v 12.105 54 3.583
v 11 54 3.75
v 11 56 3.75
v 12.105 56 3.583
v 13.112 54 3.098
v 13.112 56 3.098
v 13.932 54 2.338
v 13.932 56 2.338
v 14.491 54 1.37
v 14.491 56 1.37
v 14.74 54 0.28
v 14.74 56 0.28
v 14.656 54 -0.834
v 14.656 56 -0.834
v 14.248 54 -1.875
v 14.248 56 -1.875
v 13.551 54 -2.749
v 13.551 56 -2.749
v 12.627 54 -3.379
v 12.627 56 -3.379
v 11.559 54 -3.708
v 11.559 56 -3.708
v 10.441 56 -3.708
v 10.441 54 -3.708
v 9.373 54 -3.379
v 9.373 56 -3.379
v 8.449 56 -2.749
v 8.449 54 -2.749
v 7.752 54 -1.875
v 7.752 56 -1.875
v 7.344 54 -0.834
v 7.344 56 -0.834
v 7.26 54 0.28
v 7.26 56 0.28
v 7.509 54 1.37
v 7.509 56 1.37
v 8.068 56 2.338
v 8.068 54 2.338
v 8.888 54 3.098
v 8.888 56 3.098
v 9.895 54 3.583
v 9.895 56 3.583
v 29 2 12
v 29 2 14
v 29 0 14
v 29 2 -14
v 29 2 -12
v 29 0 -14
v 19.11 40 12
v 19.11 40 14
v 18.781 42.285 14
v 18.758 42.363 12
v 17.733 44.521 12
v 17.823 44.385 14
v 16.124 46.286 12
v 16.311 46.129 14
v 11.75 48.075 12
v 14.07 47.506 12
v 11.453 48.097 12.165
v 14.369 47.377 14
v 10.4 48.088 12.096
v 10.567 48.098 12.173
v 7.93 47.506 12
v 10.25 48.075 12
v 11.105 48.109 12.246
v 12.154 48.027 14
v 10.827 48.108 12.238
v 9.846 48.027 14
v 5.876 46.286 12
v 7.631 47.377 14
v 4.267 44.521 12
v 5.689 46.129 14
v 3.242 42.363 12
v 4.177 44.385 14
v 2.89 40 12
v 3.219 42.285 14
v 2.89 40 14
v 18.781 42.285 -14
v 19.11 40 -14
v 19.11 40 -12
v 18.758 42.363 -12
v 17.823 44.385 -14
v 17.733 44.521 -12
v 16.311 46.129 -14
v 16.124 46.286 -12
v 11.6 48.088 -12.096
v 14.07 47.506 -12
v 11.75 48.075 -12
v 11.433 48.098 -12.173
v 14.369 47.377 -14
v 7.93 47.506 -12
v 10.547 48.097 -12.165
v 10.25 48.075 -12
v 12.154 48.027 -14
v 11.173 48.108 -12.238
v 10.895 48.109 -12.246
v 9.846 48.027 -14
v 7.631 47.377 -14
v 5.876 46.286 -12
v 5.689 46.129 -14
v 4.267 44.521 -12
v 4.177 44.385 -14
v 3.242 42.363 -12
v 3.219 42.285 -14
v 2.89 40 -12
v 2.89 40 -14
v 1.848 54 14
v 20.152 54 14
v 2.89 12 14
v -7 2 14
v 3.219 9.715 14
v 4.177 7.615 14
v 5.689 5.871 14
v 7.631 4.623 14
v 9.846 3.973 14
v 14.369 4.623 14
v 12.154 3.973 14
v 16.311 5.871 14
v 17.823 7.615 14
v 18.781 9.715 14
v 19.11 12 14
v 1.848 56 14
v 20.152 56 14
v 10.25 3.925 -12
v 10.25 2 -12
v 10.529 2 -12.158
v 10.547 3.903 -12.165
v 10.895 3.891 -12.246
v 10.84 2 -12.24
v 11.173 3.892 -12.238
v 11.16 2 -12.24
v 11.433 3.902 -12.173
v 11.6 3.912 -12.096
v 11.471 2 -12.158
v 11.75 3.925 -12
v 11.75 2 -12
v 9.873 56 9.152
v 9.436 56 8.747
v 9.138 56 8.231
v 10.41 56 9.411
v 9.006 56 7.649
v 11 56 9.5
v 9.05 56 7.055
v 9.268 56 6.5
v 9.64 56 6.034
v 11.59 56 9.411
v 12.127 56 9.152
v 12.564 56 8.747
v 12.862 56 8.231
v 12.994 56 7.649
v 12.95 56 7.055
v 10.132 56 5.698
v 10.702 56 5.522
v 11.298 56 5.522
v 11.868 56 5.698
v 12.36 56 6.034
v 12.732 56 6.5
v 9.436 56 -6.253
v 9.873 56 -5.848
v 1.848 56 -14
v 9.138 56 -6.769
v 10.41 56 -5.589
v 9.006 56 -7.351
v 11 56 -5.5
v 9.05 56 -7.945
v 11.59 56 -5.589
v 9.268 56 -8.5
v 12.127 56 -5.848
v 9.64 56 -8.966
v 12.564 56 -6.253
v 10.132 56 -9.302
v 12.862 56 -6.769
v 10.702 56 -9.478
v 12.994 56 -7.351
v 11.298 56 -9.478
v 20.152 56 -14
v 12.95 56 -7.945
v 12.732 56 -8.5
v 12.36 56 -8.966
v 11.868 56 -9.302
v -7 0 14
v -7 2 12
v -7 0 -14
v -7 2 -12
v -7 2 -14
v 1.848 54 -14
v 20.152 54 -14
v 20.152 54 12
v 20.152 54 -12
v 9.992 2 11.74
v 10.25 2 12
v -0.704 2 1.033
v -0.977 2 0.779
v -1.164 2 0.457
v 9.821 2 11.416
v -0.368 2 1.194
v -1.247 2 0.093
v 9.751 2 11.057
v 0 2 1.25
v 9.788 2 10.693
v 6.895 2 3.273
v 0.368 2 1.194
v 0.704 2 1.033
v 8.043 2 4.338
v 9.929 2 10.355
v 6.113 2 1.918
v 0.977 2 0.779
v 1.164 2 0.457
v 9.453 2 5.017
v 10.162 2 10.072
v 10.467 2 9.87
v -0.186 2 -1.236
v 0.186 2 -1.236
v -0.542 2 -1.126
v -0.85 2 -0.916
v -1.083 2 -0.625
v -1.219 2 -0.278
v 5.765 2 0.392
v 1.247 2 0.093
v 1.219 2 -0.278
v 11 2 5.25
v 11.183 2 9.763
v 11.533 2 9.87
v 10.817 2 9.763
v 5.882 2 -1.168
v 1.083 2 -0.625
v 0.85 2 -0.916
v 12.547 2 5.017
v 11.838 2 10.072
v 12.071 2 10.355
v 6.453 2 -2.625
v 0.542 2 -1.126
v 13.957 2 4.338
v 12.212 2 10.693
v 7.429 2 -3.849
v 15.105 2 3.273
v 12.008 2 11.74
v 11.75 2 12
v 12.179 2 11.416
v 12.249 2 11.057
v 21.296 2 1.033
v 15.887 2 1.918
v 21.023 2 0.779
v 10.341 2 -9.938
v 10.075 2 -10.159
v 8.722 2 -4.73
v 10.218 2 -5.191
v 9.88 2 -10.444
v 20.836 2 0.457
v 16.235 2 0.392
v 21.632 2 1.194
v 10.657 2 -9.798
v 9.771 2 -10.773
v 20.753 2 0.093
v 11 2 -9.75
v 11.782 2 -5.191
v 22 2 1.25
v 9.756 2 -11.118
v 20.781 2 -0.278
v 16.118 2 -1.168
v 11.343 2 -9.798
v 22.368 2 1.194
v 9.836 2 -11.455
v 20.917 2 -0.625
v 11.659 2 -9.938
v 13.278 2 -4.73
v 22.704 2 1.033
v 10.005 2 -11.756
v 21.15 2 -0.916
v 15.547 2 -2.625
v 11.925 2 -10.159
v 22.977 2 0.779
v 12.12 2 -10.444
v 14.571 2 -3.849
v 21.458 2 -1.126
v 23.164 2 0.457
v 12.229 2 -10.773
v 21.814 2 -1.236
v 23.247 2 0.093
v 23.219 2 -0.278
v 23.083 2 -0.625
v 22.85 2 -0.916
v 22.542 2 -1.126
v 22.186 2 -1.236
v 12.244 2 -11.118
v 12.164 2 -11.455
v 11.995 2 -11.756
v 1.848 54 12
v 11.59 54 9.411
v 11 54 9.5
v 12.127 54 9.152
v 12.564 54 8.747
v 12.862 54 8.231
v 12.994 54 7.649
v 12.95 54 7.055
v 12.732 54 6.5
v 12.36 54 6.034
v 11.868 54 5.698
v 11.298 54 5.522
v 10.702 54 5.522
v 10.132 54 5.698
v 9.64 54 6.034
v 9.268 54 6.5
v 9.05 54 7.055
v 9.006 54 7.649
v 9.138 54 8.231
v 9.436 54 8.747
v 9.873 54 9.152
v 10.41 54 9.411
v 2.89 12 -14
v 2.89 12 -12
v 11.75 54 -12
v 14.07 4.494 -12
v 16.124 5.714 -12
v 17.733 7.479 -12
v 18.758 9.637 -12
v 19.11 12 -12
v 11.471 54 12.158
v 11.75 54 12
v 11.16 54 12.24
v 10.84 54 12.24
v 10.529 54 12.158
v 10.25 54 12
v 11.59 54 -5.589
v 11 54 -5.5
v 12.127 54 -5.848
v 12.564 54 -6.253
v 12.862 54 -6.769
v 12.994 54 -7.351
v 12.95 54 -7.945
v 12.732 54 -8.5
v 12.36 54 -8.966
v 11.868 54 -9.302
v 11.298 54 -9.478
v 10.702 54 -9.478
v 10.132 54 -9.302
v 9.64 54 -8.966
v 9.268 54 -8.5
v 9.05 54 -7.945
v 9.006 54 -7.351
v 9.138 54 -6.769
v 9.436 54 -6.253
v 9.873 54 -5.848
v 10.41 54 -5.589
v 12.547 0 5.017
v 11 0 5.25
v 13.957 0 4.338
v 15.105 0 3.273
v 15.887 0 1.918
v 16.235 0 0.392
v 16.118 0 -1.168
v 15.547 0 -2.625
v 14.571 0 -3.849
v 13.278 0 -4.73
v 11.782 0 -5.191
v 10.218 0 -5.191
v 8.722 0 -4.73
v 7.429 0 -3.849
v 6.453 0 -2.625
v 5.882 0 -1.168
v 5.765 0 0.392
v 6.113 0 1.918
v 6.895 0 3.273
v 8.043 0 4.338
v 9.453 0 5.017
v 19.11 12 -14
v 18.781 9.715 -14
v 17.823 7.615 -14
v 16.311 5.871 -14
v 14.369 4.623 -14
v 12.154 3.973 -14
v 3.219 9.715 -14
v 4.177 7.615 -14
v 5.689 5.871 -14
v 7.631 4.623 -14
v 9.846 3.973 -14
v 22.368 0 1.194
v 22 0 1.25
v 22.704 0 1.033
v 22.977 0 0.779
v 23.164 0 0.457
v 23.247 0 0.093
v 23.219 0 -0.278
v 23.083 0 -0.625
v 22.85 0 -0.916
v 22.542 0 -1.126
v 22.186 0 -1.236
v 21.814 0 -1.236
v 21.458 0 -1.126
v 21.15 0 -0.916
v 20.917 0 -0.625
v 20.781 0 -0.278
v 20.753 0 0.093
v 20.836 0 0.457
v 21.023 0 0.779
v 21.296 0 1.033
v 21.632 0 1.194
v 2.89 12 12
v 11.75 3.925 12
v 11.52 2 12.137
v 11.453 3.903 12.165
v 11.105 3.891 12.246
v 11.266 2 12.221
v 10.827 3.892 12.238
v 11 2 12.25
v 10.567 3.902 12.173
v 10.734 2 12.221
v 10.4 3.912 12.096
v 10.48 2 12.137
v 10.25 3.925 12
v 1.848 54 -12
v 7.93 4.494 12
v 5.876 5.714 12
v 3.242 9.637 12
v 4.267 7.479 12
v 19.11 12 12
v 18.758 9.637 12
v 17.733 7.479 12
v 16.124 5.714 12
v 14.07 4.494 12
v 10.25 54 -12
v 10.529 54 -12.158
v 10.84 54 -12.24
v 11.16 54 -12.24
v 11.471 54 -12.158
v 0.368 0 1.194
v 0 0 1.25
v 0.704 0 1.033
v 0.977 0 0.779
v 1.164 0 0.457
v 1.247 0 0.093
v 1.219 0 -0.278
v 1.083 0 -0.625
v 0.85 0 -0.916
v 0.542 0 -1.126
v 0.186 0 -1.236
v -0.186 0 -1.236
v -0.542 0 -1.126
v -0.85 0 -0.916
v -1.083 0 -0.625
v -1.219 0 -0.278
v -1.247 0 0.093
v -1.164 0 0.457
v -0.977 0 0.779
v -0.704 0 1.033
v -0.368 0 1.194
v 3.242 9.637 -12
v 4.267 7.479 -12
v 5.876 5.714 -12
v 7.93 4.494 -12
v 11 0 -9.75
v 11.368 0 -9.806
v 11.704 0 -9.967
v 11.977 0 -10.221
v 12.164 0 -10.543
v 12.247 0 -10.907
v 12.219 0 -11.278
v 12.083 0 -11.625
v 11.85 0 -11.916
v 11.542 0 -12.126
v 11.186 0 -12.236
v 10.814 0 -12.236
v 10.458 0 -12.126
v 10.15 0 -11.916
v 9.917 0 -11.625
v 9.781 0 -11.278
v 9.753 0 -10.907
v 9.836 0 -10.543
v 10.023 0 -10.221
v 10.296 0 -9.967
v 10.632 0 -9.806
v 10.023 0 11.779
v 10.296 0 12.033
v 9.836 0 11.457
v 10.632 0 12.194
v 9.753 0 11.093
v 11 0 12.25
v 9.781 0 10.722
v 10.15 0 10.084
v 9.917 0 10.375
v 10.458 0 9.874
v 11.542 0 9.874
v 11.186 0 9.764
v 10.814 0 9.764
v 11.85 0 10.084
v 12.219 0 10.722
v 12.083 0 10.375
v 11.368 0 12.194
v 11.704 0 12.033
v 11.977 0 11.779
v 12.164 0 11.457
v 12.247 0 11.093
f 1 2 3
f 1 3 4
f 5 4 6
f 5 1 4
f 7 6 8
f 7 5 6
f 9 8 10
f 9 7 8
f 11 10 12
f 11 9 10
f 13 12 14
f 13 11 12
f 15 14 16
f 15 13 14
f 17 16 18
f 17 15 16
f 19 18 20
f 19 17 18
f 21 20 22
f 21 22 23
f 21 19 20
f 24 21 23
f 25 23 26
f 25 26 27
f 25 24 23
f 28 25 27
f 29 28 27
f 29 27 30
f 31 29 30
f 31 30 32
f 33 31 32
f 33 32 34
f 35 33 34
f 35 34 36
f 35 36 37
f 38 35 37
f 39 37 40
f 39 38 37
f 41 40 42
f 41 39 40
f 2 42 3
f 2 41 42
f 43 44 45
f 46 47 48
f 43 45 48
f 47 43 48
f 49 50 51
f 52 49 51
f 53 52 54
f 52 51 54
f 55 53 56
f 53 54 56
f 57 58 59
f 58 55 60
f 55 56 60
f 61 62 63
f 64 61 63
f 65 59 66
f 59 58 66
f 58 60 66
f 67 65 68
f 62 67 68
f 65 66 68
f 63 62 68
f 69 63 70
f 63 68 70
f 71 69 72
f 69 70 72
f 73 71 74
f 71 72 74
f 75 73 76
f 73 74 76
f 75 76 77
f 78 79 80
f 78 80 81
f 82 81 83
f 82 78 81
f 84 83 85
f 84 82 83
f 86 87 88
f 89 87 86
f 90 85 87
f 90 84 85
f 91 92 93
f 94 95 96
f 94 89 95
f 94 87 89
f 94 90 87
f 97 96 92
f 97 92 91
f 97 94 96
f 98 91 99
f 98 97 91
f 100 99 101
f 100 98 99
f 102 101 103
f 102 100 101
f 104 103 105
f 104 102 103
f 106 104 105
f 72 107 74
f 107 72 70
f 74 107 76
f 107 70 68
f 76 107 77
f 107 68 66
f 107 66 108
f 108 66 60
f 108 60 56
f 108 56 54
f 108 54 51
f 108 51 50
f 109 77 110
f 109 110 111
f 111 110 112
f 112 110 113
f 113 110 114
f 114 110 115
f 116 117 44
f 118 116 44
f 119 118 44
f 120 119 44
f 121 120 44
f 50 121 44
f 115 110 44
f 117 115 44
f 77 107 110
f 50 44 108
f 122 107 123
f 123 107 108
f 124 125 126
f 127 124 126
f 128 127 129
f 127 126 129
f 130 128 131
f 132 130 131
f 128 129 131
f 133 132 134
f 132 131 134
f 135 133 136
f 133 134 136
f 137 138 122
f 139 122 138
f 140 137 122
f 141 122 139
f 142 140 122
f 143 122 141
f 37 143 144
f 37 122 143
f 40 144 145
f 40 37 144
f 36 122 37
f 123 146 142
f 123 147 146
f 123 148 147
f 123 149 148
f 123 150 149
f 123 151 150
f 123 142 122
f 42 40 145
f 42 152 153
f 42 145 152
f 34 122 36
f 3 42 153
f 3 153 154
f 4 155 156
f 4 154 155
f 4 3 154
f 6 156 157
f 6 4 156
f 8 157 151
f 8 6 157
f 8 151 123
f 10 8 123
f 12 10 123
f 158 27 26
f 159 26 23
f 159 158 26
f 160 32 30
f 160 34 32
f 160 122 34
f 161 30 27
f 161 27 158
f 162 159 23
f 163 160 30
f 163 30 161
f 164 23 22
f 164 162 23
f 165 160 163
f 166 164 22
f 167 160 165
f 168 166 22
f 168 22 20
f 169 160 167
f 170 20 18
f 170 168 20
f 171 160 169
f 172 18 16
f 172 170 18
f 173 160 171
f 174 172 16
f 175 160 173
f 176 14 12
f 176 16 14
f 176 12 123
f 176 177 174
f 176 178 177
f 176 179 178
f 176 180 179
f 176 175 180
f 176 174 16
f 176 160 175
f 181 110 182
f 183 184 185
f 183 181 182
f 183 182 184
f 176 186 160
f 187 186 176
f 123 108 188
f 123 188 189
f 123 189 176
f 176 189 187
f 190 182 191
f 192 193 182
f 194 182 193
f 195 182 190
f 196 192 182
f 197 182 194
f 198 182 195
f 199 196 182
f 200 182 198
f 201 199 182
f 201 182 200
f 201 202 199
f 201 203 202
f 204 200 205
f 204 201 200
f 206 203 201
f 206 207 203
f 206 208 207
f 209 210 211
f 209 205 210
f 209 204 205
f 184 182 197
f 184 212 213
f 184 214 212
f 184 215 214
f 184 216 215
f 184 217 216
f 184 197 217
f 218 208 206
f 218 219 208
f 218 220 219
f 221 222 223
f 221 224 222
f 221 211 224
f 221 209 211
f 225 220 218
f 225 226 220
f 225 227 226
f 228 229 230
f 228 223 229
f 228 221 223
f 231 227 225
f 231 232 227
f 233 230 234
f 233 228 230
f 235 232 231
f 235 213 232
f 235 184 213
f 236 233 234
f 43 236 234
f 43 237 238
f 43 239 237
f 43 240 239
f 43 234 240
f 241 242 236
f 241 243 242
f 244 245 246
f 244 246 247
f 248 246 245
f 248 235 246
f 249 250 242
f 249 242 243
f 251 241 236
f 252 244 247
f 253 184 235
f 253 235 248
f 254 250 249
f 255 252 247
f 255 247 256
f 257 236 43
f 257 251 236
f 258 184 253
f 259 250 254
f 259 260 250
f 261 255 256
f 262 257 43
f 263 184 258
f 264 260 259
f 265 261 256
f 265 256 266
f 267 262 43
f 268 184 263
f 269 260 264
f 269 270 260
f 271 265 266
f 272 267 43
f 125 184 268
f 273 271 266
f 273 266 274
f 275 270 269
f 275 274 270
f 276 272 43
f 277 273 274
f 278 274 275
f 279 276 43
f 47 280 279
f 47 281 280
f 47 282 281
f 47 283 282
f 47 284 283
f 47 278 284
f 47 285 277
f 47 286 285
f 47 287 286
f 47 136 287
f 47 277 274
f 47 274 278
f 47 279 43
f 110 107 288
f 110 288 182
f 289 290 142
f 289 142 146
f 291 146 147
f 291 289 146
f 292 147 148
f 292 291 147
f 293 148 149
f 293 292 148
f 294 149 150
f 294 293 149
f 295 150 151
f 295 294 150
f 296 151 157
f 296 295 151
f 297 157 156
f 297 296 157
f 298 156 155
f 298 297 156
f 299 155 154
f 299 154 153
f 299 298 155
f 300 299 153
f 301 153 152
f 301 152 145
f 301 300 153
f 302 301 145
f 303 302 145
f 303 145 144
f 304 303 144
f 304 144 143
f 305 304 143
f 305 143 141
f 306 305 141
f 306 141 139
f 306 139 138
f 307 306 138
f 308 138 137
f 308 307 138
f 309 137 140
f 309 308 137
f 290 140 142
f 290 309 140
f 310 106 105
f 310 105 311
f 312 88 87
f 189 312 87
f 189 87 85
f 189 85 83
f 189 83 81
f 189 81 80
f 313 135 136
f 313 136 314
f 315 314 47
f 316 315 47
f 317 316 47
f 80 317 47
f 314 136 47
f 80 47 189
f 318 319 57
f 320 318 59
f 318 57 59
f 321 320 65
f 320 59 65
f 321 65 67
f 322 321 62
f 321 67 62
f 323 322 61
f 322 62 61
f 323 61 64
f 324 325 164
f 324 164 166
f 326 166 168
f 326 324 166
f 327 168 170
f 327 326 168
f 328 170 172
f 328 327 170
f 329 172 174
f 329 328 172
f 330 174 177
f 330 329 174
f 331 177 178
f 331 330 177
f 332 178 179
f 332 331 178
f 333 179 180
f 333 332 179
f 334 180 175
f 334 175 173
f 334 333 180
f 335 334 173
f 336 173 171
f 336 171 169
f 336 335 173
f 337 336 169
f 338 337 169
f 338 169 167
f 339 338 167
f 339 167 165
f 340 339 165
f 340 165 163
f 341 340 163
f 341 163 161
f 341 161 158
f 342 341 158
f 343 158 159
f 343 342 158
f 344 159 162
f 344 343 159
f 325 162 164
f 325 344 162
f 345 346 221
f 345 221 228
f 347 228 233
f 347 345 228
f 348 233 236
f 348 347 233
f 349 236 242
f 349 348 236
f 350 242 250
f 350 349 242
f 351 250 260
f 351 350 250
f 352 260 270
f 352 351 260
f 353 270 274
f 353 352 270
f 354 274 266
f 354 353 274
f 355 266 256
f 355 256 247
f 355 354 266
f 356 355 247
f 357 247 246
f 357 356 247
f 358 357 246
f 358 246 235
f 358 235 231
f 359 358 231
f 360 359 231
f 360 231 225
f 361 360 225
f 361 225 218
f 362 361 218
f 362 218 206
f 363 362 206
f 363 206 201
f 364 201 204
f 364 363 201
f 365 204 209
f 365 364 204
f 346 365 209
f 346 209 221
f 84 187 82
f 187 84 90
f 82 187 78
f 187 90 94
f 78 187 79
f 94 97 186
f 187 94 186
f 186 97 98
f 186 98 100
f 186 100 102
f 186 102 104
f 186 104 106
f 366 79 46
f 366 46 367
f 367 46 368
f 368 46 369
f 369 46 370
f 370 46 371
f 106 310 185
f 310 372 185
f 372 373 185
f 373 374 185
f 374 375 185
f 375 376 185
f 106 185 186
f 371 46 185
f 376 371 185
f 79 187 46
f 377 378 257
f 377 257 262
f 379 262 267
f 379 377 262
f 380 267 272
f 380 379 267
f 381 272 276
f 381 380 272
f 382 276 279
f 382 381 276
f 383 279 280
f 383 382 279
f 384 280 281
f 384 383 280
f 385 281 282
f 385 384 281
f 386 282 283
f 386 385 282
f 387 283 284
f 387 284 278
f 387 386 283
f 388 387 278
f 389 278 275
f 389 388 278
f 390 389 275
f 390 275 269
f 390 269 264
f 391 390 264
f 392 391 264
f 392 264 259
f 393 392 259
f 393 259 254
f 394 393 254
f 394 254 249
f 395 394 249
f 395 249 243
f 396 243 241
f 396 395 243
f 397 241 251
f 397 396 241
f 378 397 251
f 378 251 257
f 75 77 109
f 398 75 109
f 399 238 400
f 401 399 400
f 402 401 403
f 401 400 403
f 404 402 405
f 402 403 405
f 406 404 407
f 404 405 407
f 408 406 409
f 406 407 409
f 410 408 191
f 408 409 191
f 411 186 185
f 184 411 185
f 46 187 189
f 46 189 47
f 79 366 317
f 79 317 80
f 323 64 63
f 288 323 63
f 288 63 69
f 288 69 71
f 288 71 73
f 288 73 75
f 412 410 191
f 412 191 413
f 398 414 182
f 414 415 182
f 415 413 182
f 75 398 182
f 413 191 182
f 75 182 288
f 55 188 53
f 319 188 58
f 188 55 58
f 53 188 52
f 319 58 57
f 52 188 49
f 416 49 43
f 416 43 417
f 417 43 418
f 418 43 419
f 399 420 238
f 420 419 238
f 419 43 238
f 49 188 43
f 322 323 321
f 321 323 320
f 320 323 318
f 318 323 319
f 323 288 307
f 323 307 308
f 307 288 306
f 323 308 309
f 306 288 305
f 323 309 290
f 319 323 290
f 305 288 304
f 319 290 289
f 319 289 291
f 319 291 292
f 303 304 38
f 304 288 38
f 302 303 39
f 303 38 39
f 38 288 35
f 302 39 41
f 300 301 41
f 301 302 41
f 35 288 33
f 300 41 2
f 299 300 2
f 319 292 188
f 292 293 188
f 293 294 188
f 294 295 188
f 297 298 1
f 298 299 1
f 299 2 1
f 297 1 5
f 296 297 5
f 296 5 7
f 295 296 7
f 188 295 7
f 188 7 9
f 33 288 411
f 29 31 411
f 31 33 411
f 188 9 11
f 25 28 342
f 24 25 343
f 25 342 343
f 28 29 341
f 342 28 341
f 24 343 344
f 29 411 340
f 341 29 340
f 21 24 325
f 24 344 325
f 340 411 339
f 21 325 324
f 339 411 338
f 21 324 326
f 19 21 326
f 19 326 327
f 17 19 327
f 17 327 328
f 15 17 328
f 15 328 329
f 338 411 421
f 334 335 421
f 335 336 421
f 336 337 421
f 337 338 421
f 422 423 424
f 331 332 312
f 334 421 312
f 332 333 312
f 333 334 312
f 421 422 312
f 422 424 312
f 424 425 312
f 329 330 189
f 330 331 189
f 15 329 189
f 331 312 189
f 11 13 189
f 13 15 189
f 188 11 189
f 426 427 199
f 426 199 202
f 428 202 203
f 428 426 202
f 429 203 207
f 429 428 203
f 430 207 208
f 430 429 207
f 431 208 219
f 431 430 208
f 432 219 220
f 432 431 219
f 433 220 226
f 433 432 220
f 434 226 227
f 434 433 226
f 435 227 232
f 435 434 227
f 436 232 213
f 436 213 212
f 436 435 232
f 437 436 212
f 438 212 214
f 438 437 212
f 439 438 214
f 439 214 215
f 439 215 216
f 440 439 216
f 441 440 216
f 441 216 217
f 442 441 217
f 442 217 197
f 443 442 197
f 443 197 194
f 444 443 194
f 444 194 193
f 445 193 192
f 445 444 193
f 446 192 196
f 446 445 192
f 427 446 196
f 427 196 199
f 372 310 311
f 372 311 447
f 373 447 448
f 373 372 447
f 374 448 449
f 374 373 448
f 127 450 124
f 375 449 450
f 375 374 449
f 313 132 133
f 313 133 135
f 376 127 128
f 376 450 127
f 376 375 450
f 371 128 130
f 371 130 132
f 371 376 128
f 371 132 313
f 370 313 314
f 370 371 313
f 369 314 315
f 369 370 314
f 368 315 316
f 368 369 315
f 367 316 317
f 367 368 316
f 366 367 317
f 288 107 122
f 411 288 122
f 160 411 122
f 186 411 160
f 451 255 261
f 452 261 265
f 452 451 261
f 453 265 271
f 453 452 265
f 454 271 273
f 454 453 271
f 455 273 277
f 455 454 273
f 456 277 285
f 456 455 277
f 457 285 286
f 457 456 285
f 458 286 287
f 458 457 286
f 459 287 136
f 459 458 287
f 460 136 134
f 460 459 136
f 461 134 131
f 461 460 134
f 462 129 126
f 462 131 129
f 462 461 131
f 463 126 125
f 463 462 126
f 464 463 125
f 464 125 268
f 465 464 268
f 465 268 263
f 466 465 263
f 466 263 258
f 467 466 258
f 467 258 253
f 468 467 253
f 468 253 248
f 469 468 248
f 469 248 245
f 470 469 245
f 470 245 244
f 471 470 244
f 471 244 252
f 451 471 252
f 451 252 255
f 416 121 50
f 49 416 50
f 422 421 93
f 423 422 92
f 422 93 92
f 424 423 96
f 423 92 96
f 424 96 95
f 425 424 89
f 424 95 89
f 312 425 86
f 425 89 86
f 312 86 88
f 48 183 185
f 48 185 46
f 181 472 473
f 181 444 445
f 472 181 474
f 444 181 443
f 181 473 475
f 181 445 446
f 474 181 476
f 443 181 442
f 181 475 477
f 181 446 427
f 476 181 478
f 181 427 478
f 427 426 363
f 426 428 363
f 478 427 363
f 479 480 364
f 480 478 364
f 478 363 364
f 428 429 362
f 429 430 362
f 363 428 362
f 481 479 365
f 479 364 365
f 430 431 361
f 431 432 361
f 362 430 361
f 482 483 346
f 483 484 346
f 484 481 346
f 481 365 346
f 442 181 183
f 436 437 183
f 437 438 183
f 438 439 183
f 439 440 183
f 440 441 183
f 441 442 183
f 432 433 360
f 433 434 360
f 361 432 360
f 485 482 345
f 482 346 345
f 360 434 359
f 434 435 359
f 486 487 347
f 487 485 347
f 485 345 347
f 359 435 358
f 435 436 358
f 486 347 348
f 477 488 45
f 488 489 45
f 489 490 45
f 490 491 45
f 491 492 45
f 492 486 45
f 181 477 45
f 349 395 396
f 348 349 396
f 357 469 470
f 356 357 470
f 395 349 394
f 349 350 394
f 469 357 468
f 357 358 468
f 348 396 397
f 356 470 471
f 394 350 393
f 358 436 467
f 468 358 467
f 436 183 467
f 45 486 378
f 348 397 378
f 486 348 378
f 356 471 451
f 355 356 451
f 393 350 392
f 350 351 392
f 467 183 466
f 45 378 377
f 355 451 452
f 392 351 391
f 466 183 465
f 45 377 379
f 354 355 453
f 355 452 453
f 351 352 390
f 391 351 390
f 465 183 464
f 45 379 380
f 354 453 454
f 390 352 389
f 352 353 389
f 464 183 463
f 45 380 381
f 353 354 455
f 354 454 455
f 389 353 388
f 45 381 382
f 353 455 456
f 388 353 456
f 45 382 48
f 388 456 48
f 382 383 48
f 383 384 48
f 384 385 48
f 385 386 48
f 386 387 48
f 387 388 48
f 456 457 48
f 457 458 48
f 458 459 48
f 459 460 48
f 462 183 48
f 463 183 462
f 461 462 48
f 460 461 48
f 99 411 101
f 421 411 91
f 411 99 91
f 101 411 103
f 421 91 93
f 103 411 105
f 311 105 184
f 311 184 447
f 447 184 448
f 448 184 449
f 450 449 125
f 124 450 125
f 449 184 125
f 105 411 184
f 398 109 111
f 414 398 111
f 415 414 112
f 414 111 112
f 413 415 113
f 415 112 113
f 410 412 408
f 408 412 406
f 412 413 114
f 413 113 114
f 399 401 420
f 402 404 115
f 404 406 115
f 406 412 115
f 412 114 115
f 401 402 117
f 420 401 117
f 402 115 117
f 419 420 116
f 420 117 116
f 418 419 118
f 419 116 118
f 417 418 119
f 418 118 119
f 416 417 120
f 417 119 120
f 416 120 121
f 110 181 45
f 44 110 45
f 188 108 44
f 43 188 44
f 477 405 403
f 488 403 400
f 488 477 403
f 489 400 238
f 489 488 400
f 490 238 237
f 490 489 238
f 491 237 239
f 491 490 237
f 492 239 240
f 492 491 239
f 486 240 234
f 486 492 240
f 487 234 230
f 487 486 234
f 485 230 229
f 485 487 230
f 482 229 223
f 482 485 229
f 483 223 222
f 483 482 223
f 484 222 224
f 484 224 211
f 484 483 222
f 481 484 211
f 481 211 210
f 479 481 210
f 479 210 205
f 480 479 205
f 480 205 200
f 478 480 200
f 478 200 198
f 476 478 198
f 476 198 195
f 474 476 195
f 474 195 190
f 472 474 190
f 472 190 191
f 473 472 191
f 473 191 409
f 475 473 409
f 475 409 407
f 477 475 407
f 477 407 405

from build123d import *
from build123d.topology import SkipClean

# Parameters (mm, degrees)
SKETCH1_W            = 36
SKETCH1_H            = 28
SKETCH1_R            = 1.25
SKETCH1_R_2          = 5.25
BOSS_EXTRUDE1_DEPTH  = 2
BOSS_EXTRUDE2_DEPTH  = 52
CUT_EXTRUDE1_DEPTH   = 2
MIRROR2_COPY_1_DEPTH = 2
CUT_EXTRUDE2_DEPTH   = 2
SKETCH6_W            = 18.304542046
SKETCH6_H            = 28
SKETCH6_R            = 3.75
SKETCH6_R_2          = 2
BOSS_EXTRUDE3_DEPTH  = 2


# Read off the part's stored shape, not the designer's step: Boss-Extrude2
with BuildPart() as part:
    # Sketch1 → Boss-Extrude1 (new body)
    with BuildSketch(Plane(origin=(0, 0, 0), x_dir=(1, 0, 0), z_dir=(0, 1, 0))):
        with Locations((11, 0)):
            Rectangle(SKETCH1_W, SKETCH1_H)
        with Locations(Location((0, 0, 0), (0, 0, 270))):
            Circle(SKETCH1_R, mode=Mode.SUBTRACT)
        with Locations(Location((22, 0, 0), (0, 0, 270))):
            Circle(SKETCH1_R, mode=Mode.SUBTRACT)
        with Locations(Location((11, 11, 0), (0, 0, 270))):
            Circle(SKETCH1_R, mode=Mode.SUBTRACT)
        with Locations(Location((11, -11, 0), (0, 0, 270))):
            Circle(SKETCH1_R, mode=Mode.SUBTRACT)
        with Locations(Location((11, 0, 0), (0, 0, 270))):
            Circle(SKETCH1_R_2, mode=Mode.SUBTRACT)
    extrude(amount=BOSS_EXTRUDE1_DEPTH)

    # Boss-Extrude2 outline → Boss-Extrude2 (add)
    with SkipClean():  # the faces are left unmerged after this step: merging them gives an invalid solid
        with BuildSketch(Plane(origin=(0, 2, 0), x_dir=(1, 0, 0), z_dir=(0, 1, 0))):
            with BuildLine():
                Line((29, 14), (-7, 14))
                Line((-7, 14), (-7, 12))
                Line((-7, 12), (10.25, 12))
                ThreePointArc((10.25, 12), (11, 12.25), (11.75, 12))
                Line((11.75, 12), (29, 12))
                Line((29, 12), (29, 14))
            make_face()
            with BuildLine():
                Line((10.25, -12), (-7, -12))
                Line((-7, -12), (-7, -14))
                Line((-7, -14), (29, -14))
                Line((29, -14), (29, -12))
                Line((29, -12), (11.75, -12))
                ThreePointArc((11.75, -12), (11, -12.25), (10.25, -12))
            make_face()
        extrude(amount=BOSS_EXTRUDE2_DEPTH)

    # Sketch5 → Cut-Extrude1 (cut)
    with SkipClean():  # the faces are left unmerged after this step: merging them gives an invalid solid
        with BuildSketch(Plane(origin=(0, 0, -14), x_dir=(-1, 0, 0), z_dir=(0, 0, -1))):
            Polygon((-29, 54), (-20.152271023, 54), (-29, 2), align=None)
        cut_extrude1 = extrude(amount=-CUT_EXTRUDE1_DEPTH, mode=Mode.SUBTRACT)

    # Mirror1: Cut-Extrude1 across plane
    with SkipClean():  # the faces are left unmerged after this step: merging them gives an invalid solid
        add(cut_extrude1.mirror(Plane(origin=(11, 0, 0), x_dir=(0, 0, 1), z_dir=(1, 0, 0))), mode=Mode.SUBTRACT)

    # Mirror2: Cut-Extrude1 across plane
    with SkipClean():  # the faces are left unmerged after this step: merging them gives an invalid solid
        add(cut_extrude1.mirror(Plane(origin=(0, 0, 0), x_dir=(1, 0, 0), z_dir=(0, 0, -1))), mode=Mode.SUBTRACT)

    # Mirror2 copy 1 sketch → Mirror2 copy 1 (cut)
    with SkipClean():  # the faces are left unmerged after this step: merging them gives an invalid solid
        with BuildSketch(Plane(origin=(22, 0, 14), x_dir=(1, 0, 0), z_dir=(0, 0, 1))):
            Polygon((-29, 54), (-20.152271023, 54), (-29, 2), align=None)
        extrude(amount=-MIRROR2_COPY_1_DEPTH, mode=Mode.SUBTRACT)

    # Sketch3 → Cut-Extrude2 (cut)
    with SkipClean():  # the faces are left unmerged after this step: merging them gives an invalid solid
        with BuildSketch(Plane(origin=(0, 0, -14), x_dir=(-1, 0, 0), z_dir=(0, 0, -1))):
            with BuildLine():
                Line((-2.889996266, 40), (-2.889996266, 12))
                ThreePointArc((-2.889996266, 12), (-11, 3.889996266), (-19.110003734, 12))
                Line((-19.110003734, 12), (-19.110003734, 40))
                ThreePointArc((-19.110003734, 40), (-11, 48.110003734), (-2.889996266, 40))
            make_face()
        cut_extrude2 = extrude(amount=-CUT_EXTRUDE2_DEPTH, mode=Mode.SUBTRACT)

    # Mirror3: Cut-Extrude2 across plane
    with SkipClean():  # the faces are left unmerged after this step: merging them gives an invalid solid
        add(cut_extrude2.mirror(Plane(origin=(0, 0, 0), x_dir=(1, 0, 0), z_dir=(0, 0, -1))), mode=Mode.SUBTRACT)

    # Sketch6 → Boss-Extrude3 (add)
    with SkipClean():  # the faces are left unmerged after this step: merging them gives an invalid solid
        with BuildSketch(Plane(origin=(0, 54, 0), x_dir=(1, 0, 0), z_dir=(0, 1, 0))):
            with Locations((11, 0)):
                Rectangle(SKETCH6_W, SKETCH6_H)
            with Locations(Location((11, 0, 0), (0, 0, 270))):
                Circle(SKETCH6_R, mode=Mode.SUBTRACT)
            with Locations(Location((11, -7.5, 0), (0, 0, 270))):
                Circle(SKETCH6_R_2, mode=Mode.SUBTRACT)
            with Locations(Location((11, 7.5, 0), (0, 0, 270))):
                Circle(SKETCH6_R_2, mode=Mode.SUBTRACT)
        extrude(amount=BOSS_EXTRUDE3_DEPTH)


solid = part.part
